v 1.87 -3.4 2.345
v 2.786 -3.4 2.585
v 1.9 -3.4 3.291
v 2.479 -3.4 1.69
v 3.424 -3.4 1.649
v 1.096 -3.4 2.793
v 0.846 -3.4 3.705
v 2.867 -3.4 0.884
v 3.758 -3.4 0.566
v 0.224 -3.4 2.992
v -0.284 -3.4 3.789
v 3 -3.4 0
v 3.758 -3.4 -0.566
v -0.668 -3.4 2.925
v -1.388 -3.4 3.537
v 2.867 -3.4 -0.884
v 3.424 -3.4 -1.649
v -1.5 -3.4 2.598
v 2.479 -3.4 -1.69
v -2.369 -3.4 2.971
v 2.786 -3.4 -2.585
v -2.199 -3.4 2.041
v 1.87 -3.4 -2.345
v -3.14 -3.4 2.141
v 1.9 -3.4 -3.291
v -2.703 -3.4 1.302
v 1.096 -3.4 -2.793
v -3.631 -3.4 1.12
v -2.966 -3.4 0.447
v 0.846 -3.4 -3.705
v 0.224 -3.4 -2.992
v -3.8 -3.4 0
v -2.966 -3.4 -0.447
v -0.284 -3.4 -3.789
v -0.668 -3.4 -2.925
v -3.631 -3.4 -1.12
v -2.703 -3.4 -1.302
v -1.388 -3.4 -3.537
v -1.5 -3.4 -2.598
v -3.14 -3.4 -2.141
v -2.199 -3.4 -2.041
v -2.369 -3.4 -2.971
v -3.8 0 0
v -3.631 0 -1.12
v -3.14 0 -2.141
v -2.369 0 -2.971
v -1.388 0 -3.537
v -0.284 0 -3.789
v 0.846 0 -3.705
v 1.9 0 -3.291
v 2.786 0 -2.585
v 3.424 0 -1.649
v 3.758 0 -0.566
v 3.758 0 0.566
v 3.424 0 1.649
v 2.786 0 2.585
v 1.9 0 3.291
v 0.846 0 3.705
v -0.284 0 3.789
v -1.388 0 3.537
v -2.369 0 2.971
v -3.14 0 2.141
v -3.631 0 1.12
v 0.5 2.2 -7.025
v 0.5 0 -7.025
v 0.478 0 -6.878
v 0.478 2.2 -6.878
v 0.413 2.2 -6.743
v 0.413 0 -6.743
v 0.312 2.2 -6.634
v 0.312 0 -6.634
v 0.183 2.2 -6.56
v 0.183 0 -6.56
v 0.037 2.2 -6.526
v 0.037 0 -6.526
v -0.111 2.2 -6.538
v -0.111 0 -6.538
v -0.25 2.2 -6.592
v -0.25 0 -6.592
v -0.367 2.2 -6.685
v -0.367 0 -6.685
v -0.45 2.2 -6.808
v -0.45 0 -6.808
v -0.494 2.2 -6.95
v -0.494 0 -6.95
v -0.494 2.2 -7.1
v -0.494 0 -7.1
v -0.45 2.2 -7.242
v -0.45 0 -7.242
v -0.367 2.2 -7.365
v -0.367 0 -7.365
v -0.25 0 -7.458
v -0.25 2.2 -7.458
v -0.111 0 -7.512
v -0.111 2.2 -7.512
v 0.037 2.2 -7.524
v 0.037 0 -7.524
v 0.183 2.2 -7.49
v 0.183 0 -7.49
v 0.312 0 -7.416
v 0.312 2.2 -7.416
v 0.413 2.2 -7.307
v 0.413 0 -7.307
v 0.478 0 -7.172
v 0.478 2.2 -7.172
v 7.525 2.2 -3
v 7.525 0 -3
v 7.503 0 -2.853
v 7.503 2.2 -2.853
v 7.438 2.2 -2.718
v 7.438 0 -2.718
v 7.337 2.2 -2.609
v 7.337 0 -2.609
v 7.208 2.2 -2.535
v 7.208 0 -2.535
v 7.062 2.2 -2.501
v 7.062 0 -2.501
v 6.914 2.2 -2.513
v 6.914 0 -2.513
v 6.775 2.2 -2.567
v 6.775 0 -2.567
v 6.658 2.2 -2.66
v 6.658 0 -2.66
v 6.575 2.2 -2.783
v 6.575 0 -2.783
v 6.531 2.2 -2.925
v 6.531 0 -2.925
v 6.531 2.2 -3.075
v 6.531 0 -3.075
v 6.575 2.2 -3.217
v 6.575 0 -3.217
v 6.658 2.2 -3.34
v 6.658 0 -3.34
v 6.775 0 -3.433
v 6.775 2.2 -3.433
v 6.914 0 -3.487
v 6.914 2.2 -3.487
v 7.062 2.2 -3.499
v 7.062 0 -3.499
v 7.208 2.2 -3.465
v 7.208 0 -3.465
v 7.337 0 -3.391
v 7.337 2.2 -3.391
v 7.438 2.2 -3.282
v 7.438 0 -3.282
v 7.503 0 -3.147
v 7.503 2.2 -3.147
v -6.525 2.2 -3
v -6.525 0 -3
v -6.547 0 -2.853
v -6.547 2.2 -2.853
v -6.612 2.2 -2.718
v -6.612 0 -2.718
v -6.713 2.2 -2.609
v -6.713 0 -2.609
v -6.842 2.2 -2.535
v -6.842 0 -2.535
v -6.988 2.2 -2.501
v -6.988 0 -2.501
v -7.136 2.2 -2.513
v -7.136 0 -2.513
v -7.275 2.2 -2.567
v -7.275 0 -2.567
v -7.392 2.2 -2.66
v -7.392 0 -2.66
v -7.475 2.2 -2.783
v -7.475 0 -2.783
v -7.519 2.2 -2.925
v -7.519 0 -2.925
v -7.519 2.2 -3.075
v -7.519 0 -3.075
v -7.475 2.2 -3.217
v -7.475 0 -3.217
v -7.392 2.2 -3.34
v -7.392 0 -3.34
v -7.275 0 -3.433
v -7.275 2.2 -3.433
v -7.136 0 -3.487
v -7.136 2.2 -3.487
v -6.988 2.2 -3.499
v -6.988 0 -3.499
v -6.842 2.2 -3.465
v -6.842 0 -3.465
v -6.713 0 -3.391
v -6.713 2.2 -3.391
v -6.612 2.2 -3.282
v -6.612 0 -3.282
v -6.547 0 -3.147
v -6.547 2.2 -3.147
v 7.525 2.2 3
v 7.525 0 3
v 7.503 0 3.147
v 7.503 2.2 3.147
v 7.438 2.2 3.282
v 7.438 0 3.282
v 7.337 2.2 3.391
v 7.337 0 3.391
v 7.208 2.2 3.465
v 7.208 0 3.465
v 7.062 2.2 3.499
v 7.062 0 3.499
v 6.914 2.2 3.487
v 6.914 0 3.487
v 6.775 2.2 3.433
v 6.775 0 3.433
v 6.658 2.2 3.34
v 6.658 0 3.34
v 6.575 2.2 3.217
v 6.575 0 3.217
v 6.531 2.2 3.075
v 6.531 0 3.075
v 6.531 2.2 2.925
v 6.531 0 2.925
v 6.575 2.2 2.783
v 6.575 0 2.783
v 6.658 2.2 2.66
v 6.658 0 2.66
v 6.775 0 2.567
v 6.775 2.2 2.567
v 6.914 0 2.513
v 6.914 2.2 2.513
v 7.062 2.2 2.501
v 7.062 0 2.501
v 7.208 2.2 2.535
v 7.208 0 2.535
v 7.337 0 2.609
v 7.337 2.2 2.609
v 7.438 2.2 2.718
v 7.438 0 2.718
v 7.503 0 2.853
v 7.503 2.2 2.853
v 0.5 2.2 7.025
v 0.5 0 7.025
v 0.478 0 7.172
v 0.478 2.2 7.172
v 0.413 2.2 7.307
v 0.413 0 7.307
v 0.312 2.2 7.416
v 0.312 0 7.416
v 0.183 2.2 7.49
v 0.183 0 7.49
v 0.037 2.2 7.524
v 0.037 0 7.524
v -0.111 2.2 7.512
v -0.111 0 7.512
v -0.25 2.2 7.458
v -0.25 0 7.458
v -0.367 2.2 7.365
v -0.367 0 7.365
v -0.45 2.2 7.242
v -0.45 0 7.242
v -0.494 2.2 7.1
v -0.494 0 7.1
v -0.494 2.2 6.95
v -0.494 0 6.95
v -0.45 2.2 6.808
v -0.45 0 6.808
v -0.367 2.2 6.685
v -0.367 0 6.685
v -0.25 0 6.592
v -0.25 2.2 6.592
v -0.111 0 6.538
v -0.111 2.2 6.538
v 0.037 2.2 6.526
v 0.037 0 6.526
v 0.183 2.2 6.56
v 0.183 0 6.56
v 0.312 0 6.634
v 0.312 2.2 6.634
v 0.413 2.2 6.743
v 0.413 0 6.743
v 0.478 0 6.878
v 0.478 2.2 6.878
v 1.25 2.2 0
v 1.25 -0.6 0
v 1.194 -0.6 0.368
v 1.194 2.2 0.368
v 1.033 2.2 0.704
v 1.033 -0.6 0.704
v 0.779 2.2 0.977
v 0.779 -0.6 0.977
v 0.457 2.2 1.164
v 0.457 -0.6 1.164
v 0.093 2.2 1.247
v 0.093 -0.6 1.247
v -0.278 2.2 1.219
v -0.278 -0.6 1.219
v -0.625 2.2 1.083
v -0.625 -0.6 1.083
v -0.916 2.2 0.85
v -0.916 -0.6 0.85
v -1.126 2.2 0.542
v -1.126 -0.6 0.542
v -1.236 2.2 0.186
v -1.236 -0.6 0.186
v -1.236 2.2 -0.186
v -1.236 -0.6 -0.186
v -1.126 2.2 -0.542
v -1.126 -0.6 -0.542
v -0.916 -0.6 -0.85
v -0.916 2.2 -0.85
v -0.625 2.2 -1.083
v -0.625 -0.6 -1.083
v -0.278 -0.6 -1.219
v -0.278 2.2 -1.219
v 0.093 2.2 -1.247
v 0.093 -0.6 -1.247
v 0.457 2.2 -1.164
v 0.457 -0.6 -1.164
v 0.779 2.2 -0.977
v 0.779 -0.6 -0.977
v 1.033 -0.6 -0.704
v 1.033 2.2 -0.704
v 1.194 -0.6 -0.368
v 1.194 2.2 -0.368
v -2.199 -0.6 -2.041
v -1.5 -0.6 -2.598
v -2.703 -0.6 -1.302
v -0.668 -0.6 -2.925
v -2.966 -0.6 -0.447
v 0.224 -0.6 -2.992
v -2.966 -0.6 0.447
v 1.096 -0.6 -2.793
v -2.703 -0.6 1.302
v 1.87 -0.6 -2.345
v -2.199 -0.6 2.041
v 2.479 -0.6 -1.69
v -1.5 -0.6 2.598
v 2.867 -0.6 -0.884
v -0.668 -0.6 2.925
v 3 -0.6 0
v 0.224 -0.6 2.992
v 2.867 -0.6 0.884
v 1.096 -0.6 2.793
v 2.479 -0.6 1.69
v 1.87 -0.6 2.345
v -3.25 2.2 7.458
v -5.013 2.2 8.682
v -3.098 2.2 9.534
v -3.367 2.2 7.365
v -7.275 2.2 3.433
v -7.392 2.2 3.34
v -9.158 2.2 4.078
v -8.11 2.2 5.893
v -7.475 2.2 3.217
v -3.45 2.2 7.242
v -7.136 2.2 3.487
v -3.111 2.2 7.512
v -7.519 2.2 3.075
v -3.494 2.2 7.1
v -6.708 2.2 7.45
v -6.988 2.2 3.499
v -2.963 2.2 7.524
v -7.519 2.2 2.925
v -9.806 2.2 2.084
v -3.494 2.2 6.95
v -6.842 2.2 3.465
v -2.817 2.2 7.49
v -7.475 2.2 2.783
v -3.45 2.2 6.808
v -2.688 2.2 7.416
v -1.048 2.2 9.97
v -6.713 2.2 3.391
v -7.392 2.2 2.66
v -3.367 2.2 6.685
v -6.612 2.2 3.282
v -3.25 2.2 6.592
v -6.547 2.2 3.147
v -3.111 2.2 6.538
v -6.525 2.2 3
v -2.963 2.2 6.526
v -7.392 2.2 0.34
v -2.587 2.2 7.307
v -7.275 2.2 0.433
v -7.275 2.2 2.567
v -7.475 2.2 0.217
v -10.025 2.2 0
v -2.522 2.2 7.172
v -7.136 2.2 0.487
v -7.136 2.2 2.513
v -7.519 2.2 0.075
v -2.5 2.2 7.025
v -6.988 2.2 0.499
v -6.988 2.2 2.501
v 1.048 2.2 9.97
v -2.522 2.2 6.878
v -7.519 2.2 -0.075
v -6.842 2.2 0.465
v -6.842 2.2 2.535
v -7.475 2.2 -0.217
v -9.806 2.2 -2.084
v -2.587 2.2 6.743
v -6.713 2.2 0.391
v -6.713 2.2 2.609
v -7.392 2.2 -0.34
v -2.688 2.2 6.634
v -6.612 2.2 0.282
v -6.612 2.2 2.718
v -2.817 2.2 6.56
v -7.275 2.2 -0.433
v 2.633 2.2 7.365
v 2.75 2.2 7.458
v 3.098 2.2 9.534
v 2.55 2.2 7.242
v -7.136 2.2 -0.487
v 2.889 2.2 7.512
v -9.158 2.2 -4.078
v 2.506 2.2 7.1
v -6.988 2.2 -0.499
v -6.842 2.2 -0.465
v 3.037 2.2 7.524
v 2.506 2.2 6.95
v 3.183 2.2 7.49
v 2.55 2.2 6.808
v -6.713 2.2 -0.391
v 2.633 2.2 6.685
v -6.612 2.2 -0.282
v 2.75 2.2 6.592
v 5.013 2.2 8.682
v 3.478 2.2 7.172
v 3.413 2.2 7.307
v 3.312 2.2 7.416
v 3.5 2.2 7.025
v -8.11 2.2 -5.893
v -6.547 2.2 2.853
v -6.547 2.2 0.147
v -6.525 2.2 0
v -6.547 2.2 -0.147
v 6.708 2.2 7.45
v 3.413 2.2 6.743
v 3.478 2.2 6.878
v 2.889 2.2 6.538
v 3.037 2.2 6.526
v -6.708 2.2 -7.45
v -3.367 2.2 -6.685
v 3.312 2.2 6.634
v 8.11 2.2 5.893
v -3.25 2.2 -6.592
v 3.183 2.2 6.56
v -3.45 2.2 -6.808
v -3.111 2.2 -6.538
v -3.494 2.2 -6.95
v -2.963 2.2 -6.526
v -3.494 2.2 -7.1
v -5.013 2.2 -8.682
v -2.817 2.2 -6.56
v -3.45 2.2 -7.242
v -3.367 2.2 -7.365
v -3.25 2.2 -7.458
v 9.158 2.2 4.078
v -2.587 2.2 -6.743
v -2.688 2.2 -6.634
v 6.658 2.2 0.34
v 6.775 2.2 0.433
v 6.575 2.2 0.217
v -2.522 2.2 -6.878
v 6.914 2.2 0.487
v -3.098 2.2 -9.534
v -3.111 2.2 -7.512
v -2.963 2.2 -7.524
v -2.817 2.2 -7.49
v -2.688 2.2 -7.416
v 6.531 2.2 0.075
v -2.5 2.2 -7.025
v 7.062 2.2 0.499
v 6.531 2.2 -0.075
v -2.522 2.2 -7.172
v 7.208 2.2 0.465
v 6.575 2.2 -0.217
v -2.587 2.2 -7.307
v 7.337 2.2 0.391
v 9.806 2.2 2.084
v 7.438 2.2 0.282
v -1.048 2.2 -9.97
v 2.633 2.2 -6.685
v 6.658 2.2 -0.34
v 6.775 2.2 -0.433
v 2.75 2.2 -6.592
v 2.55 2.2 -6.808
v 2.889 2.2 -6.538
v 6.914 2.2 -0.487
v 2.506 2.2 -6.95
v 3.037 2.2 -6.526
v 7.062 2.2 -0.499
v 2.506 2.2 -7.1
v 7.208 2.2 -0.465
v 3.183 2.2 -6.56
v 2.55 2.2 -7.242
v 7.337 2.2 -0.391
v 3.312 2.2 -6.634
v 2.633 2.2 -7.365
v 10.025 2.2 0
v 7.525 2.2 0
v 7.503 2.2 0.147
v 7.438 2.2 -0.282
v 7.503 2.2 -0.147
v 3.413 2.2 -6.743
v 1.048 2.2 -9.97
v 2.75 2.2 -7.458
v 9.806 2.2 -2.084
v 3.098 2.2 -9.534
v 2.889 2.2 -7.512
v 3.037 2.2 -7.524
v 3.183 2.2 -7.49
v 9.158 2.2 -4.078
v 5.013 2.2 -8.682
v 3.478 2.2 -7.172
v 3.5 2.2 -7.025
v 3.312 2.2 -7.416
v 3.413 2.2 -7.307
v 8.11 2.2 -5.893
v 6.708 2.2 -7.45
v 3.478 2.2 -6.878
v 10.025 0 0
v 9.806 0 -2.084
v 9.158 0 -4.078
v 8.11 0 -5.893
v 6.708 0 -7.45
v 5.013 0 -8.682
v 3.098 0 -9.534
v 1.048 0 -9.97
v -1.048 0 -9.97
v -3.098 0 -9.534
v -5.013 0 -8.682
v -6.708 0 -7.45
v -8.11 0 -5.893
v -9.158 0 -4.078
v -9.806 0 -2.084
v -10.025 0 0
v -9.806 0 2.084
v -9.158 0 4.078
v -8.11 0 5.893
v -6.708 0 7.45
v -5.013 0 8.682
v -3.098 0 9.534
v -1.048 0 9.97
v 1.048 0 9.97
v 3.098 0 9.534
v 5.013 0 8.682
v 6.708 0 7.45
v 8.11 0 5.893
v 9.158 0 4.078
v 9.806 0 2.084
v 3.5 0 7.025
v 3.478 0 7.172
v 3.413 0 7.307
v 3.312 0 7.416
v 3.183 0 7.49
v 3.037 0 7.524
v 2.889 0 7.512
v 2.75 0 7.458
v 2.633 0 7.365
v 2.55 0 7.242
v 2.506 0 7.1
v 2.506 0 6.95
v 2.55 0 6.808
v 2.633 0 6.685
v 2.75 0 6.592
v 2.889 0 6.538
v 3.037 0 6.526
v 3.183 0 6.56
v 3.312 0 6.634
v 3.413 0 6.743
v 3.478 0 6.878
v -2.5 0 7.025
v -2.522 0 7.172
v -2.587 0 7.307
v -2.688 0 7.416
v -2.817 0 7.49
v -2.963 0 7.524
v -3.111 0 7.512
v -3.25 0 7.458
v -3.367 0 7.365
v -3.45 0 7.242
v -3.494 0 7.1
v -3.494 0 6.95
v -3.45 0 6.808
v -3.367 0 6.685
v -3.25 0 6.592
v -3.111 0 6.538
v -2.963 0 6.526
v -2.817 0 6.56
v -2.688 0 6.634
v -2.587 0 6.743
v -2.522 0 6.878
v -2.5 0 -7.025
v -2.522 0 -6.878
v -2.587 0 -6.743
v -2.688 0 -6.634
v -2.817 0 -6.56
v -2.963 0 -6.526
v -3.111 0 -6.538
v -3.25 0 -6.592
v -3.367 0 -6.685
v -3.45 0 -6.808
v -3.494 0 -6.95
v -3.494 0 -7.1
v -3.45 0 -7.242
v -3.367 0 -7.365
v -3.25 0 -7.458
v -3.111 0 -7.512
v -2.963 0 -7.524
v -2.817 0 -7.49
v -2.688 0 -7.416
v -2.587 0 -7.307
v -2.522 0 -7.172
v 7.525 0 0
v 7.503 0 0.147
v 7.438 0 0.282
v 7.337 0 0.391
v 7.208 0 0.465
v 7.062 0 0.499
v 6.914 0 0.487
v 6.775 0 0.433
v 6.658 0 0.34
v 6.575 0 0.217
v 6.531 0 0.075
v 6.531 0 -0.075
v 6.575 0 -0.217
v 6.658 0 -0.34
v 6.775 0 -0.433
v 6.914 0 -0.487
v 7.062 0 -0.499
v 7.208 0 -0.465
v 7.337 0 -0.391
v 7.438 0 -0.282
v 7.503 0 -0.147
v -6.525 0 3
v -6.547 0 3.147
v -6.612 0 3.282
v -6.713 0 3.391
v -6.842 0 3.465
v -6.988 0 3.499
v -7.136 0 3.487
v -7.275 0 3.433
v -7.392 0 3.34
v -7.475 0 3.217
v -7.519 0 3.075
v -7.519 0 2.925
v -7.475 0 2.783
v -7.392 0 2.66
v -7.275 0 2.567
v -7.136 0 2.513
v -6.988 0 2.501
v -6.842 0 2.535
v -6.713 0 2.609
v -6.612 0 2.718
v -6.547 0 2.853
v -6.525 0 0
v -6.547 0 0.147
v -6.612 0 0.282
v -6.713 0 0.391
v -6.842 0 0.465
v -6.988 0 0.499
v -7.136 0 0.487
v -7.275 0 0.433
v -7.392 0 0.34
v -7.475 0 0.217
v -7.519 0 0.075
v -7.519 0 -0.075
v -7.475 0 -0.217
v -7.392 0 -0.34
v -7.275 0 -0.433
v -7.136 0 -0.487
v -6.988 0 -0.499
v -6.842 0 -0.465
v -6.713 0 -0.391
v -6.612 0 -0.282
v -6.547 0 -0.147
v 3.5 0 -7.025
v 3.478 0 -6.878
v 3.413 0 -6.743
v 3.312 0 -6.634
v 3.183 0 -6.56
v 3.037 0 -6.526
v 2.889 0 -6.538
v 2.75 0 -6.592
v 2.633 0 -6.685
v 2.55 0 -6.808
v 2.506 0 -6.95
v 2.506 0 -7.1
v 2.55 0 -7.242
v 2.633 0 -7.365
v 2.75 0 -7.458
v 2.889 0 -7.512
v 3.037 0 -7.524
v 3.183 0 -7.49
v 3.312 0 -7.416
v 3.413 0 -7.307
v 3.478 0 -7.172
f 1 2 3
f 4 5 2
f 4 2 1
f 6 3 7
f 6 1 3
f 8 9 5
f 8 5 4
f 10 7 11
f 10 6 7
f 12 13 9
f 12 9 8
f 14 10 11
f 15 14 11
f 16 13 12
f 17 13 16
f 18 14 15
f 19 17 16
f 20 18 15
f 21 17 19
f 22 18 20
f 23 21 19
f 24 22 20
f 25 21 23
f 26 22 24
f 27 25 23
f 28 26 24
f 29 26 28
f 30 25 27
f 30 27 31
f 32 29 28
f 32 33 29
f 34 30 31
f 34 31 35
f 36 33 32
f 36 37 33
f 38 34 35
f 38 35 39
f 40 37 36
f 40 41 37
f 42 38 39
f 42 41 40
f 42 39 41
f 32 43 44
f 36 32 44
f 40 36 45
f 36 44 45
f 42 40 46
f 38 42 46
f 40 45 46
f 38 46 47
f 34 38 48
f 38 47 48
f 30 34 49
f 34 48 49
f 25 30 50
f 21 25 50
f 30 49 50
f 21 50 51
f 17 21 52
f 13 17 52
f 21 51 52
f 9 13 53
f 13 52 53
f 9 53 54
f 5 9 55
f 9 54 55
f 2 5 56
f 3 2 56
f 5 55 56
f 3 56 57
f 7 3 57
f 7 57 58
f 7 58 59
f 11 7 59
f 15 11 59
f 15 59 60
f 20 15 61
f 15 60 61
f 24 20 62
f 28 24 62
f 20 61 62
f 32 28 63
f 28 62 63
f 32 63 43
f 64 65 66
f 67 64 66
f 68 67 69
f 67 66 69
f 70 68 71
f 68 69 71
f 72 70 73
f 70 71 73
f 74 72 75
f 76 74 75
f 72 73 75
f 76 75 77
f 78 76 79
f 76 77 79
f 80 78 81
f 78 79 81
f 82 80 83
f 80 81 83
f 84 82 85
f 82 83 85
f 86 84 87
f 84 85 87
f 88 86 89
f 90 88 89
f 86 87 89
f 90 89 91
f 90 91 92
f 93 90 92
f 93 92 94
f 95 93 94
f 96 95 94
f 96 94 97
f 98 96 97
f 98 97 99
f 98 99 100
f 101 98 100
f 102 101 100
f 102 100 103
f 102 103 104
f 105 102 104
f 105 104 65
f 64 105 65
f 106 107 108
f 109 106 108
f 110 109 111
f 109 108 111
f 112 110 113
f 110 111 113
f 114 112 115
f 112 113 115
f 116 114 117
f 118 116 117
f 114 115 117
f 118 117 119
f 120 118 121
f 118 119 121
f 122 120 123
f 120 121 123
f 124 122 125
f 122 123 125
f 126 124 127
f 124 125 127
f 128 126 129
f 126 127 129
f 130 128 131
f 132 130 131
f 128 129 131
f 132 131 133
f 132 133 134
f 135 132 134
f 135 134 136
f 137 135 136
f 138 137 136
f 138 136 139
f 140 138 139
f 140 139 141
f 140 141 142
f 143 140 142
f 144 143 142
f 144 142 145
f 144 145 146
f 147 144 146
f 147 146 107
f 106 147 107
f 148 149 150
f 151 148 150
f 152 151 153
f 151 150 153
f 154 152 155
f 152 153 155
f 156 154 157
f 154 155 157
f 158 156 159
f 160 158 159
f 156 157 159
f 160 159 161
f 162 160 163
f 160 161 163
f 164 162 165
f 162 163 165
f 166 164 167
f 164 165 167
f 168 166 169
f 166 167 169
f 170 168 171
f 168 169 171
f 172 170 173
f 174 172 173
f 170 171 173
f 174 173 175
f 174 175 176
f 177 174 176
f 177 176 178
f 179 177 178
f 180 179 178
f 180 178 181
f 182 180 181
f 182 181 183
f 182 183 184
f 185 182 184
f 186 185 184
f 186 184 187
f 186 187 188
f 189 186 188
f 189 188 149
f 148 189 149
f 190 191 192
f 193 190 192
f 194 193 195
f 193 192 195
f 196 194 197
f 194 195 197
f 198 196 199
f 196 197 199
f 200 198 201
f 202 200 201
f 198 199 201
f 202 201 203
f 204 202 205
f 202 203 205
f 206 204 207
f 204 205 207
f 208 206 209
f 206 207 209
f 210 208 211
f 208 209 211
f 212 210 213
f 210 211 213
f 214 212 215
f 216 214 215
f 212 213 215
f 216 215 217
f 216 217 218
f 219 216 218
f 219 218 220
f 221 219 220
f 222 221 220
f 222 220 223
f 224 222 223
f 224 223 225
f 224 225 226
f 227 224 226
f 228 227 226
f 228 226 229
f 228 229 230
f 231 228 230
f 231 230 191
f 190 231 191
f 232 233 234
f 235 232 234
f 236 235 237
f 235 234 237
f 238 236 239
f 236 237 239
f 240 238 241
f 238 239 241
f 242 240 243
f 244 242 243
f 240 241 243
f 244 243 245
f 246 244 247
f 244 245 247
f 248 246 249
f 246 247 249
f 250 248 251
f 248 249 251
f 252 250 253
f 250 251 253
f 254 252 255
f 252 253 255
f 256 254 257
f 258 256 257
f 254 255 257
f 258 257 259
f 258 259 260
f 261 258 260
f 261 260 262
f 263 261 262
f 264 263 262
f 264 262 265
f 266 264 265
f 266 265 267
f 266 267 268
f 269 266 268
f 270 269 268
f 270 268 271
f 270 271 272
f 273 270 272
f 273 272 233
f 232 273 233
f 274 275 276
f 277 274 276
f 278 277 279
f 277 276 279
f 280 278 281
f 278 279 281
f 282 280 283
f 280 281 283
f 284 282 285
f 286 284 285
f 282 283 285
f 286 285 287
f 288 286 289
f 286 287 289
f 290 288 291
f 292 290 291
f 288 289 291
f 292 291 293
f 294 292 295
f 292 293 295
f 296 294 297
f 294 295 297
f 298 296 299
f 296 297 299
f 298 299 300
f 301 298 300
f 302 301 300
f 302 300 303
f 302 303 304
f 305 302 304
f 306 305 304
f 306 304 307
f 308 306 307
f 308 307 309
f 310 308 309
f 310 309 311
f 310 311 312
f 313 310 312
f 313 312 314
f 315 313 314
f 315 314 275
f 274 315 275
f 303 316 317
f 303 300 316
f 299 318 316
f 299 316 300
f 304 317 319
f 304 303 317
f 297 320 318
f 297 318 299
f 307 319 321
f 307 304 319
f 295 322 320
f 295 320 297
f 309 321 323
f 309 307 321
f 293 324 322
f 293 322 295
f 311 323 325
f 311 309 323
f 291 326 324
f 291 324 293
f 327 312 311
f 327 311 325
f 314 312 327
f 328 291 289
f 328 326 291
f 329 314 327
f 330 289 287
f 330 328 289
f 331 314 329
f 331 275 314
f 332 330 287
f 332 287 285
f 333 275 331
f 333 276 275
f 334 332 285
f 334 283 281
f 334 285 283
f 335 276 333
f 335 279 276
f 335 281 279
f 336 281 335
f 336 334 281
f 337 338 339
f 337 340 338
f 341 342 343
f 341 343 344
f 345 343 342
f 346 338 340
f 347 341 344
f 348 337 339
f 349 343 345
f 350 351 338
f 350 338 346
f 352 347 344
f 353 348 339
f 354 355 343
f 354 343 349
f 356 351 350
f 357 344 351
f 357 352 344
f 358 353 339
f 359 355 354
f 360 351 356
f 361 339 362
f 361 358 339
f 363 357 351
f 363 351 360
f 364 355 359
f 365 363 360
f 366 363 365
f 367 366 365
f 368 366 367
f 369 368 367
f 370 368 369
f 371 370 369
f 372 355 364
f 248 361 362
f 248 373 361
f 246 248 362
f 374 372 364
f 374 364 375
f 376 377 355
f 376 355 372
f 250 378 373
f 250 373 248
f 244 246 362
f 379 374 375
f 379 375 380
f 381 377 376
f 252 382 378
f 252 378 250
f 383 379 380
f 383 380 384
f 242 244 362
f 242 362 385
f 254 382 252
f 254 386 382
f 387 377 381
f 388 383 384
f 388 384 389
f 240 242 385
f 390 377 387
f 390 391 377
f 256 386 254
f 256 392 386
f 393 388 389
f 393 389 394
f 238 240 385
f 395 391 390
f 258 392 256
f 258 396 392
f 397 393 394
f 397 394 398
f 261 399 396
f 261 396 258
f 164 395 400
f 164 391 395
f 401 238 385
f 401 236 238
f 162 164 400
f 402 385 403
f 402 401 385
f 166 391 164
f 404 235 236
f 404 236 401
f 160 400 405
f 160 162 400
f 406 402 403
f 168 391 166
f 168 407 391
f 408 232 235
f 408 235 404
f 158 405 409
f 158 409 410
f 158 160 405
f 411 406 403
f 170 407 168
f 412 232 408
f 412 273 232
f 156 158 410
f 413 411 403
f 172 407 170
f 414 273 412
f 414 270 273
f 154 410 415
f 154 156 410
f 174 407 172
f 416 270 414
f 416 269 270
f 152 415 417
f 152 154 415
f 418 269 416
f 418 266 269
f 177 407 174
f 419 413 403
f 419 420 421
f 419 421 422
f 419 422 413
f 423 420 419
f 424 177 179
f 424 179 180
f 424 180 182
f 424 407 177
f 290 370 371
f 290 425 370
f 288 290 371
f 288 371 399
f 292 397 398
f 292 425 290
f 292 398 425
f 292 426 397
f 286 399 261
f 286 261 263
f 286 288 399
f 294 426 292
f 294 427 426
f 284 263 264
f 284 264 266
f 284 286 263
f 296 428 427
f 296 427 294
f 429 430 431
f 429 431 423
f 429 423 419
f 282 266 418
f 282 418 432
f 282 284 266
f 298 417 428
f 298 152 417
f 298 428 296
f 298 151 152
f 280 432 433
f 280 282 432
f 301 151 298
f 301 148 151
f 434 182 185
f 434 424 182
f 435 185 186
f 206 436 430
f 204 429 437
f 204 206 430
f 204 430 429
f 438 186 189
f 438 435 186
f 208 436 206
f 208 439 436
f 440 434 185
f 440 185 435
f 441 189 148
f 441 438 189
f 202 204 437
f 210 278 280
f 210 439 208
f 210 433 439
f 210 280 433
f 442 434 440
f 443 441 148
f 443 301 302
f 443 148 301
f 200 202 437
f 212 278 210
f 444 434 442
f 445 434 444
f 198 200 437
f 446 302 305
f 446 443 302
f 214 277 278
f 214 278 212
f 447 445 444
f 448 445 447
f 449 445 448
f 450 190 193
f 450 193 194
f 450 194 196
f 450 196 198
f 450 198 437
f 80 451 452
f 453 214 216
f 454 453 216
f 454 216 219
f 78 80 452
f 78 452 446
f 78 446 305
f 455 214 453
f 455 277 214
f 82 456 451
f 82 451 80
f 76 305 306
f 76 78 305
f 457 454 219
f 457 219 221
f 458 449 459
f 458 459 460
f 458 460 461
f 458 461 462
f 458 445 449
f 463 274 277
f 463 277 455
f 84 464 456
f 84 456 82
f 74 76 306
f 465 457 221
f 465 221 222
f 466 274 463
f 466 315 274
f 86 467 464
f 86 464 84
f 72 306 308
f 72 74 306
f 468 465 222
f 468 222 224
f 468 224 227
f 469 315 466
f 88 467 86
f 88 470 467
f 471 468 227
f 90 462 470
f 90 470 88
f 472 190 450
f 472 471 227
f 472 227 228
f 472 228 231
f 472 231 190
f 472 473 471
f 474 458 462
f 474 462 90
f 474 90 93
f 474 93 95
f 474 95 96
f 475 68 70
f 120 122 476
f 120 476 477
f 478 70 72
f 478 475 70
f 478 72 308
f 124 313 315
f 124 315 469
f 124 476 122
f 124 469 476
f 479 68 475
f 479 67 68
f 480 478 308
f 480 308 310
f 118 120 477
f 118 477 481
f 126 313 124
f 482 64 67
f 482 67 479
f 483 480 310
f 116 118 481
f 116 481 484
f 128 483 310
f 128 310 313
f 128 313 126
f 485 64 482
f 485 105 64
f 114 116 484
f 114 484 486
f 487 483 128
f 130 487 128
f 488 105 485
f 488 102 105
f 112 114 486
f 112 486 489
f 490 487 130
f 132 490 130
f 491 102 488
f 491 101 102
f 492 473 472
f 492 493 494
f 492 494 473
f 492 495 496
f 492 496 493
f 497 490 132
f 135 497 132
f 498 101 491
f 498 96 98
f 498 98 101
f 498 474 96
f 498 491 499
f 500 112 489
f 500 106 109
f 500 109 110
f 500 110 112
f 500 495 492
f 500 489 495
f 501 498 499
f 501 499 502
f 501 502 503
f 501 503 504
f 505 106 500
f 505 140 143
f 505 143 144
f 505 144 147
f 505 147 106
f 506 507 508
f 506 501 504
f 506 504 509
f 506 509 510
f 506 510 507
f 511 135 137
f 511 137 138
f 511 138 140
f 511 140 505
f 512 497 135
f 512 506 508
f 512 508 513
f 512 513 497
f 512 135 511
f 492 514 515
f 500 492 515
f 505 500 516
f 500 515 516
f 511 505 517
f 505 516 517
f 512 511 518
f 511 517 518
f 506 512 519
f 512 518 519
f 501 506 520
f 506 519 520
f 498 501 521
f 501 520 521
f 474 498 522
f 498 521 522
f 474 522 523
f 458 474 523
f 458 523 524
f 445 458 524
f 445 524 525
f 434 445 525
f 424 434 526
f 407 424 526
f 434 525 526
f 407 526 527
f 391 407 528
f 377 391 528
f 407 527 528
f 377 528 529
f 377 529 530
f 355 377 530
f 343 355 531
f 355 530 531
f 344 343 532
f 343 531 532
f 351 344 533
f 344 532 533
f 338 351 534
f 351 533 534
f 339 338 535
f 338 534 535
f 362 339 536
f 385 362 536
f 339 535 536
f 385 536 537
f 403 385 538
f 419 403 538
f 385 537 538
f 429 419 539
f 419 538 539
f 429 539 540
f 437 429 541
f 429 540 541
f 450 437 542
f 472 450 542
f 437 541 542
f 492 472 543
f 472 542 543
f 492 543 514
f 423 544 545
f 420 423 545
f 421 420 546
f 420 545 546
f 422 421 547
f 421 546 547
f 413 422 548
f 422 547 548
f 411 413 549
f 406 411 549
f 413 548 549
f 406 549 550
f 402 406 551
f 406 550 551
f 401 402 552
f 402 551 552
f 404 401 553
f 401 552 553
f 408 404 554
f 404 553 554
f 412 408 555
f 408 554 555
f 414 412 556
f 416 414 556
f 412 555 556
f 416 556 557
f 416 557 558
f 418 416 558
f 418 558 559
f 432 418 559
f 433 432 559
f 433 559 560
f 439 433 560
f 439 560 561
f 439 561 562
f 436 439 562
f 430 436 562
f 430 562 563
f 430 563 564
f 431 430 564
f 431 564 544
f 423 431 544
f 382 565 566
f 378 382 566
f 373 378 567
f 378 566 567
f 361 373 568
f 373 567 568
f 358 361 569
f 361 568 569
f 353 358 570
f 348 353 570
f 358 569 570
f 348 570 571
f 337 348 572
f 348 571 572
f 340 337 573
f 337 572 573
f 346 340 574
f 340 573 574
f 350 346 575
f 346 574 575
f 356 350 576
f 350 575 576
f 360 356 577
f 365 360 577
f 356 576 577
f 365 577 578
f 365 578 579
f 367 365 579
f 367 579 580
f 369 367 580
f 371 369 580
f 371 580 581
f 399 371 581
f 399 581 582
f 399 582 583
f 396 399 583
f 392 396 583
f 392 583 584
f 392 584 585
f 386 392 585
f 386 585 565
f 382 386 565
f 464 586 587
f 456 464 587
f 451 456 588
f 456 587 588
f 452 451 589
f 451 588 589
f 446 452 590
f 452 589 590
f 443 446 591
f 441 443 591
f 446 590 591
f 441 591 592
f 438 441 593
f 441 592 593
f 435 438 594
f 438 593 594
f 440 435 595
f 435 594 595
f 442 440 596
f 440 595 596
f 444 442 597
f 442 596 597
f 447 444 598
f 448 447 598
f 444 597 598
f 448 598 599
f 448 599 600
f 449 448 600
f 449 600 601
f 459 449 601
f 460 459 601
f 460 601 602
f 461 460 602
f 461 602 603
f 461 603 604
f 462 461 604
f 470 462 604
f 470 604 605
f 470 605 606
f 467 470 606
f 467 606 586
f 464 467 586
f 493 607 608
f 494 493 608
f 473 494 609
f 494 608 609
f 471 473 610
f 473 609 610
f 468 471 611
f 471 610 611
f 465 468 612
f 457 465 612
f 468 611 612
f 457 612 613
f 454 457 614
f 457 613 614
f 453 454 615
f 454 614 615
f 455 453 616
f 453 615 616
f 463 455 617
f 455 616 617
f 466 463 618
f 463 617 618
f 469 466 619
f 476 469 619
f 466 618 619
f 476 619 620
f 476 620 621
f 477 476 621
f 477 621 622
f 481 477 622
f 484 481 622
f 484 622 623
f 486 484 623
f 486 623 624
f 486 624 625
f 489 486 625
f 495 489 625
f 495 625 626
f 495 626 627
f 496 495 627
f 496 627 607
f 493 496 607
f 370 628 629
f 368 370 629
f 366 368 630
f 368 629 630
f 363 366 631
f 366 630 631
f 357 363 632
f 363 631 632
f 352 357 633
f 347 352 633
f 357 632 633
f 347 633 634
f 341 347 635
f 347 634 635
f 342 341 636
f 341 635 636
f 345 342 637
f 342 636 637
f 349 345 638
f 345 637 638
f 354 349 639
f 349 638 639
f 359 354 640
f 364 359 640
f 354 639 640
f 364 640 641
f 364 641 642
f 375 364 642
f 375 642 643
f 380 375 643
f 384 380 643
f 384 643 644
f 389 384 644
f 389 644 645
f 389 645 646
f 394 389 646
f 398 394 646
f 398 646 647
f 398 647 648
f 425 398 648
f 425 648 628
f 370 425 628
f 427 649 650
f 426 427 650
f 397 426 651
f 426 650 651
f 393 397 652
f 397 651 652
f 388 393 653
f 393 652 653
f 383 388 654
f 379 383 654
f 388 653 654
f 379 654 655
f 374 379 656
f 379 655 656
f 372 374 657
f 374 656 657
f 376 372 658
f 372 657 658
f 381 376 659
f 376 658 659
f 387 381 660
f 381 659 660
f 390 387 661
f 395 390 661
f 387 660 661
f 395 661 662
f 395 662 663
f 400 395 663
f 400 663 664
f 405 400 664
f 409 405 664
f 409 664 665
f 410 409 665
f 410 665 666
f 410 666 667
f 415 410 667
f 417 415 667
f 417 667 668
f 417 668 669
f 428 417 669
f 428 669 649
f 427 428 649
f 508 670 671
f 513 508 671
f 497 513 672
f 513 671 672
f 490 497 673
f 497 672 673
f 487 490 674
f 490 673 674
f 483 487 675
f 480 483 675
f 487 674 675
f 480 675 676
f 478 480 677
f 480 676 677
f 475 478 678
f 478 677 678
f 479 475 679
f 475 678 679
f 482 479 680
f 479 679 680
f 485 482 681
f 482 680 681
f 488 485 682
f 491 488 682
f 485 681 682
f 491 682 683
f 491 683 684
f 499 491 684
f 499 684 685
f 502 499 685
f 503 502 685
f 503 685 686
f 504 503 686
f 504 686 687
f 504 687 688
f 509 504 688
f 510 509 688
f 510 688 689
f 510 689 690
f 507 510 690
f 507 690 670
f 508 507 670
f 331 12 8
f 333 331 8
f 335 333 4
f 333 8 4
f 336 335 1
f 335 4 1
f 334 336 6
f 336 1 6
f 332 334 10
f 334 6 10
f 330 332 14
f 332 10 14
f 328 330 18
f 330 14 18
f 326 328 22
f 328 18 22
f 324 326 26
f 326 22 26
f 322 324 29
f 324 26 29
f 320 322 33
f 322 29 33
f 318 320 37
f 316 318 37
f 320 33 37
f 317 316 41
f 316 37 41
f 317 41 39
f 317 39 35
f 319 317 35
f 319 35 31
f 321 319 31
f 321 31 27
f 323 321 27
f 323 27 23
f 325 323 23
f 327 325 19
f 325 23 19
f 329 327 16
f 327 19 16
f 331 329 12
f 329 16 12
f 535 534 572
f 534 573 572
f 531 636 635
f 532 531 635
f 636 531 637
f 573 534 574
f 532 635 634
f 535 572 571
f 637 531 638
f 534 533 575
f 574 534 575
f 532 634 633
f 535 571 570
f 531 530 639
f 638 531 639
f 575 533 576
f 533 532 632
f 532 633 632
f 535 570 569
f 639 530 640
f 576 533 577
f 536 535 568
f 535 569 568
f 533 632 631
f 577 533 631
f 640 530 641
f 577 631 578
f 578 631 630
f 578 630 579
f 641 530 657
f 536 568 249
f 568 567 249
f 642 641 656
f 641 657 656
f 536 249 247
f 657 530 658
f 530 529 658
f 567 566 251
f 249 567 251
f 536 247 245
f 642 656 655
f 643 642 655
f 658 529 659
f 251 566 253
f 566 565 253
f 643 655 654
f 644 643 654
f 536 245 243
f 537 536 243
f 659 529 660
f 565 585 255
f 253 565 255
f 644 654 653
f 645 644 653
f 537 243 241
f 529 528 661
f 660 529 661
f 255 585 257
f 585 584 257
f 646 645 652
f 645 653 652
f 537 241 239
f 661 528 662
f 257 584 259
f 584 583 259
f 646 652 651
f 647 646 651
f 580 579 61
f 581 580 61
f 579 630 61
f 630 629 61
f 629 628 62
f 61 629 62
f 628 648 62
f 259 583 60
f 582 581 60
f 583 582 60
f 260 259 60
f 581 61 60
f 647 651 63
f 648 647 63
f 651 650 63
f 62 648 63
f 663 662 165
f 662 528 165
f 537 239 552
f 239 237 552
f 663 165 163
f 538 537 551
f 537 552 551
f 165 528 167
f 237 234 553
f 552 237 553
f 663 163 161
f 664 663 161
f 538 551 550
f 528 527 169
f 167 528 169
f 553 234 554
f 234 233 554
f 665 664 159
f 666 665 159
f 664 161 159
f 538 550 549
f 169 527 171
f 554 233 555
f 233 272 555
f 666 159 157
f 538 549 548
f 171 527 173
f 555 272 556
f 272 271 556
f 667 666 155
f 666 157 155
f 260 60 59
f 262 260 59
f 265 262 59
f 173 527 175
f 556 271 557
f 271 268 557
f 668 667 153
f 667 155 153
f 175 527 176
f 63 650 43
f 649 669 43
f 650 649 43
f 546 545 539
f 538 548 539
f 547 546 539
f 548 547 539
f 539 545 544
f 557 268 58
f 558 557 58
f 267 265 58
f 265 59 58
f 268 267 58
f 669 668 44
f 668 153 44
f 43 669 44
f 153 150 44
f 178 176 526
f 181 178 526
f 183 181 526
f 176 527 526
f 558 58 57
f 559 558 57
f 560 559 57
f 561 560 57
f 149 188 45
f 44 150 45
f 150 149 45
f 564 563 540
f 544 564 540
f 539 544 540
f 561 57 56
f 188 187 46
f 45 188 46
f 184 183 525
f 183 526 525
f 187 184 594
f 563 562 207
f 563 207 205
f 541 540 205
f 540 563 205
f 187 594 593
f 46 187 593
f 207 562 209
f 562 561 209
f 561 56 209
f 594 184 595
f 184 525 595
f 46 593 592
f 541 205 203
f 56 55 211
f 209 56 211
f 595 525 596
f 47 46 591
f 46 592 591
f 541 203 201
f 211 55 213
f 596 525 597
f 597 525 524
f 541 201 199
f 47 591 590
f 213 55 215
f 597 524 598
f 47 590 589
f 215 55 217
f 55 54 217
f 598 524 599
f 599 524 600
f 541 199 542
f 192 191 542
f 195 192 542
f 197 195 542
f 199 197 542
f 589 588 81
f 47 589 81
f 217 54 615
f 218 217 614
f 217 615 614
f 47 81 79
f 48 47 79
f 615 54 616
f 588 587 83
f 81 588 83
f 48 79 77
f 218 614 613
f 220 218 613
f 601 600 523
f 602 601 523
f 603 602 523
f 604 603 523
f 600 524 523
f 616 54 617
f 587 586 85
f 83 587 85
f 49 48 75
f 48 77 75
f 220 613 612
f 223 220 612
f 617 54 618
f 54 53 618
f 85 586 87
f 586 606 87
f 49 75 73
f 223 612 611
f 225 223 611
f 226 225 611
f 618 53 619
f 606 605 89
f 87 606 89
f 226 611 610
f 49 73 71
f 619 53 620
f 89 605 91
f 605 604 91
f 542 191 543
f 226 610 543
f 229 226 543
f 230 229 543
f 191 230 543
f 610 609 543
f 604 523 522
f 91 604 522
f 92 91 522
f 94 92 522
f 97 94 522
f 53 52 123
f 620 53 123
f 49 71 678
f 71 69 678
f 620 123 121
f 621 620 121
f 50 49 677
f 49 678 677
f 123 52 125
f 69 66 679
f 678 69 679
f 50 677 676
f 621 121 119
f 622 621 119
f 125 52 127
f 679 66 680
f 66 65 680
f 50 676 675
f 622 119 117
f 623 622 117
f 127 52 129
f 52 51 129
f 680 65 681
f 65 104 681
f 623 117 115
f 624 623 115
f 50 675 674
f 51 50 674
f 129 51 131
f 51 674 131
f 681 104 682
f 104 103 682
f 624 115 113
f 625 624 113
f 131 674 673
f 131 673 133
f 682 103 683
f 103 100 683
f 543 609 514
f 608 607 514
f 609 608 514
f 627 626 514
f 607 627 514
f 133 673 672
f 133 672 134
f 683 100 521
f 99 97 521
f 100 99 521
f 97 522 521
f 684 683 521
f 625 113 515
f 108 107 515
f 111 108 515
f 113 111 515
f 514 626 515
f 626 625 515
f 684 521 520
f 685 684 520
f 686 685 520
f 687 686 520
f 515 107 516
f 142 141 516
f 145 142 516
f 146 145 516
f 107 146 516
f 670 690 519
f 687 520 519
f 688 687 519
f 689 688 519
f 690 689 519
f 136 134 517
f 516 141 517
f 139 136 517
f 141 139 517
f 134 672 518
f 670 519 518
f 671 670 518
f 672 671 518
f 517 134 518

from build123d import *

# Parameters (mm, degrees)
SKETCH1_R           = 10.025
BOSS_EXTRUDE1_DEPTH = 2.2
SKETCH2_R           = 0.5
CUT_EXTRUDE1_DEPTH  = 3.2
SKETCH3_R           = 3.8
BOSS_EXTRUDE2_DEPTH = 3.4
SKETCH4_R           = 3
CUT_EXTRUDE2_DEPTH  = 2.8
SKETCH5_R           = 1.25
CUT_EXTRUDE3_DEPTH  = 3.8


with BuildPart() as part:
    # Sketch1 → Boss-Extrude1 (new body)
    with BuildSketch(Plane(origin=(0, 0, 0), x_dir=(1, 0, 0), z_dir=(0, 1, 0))):
        Circle(SKETCH1_R)
    extrude(amount=BOSS_EXTRUDE1_DEPTH)

    # Sketch2 → Cut-Extrude1 (cut, through all)
    with BuildSketch(Plane.XZ):
        with Locations((-7.025, -3)):
            Circle(SKETCH2_R)
        with Locations((-7.025, 0)):
            Circle(SKETCH2_R)
        with Locations((-7.025, 3)):
            Circle(SKETCH2_R)
        with Locations((-3, 7.025)):
            Circle(SKETCH2_R)
        with Locations((0, 7.025)):
            Circle(SKETCH2_R)
        with Locations((3, 7.025)):
            Circle(SKETCH2_R)
        with Locations((7.025, 3)):
            Circle(SKETCH2_R)
        with Locations((7.025, 0)):
            Circle(SKETCH2_R)
        with Locations((7.025, -3)):
            Circle(SKETCH2_R)
        with Locations((3, -7.025)):
            Circle(SKETCH2_R)
        with Locations((0, -7.025)):
            Circle(SKETCH2_R)
        with Locations((-3, -7.025)):
            Circle(SKETCH2_R)
    extrude(amount=-CUT_EXTRUDE1_DEPTH, mode=Mode.SUBTRACT)

    # Sketch3 → Boss-Extrude2 (add)
    with BuildSketch(Plane(origin=(0, 0, 0), x_dir=(-1, 0, 0), z_dir=(0, -1, 0))):
        Circle(SKETCH3_R)
    extrude(amount=BOSS_EXTRUDE2_DEPTH)

    # Sketch4 → Cut-Extrude2 (cut)
    with BuildSketch(Plane.XZ.offset(3.4)):
        Circle(SKETCH4_R)
    extrude(amount=-CUT_EXTRUDE2_DEPTH, mode=Mode.SUBTRACT)

    # Sketch5 → Cut-Extrude3 (cut, through all)
    with BuildSketch(Plane.XZ.offset(0.6)):
        Circle(SKETCH5_R)
    extrude(amount=-CUT_EXTRUDE3_DEPTH, mode=Mode.SUBTRACT)


solid = part.part
